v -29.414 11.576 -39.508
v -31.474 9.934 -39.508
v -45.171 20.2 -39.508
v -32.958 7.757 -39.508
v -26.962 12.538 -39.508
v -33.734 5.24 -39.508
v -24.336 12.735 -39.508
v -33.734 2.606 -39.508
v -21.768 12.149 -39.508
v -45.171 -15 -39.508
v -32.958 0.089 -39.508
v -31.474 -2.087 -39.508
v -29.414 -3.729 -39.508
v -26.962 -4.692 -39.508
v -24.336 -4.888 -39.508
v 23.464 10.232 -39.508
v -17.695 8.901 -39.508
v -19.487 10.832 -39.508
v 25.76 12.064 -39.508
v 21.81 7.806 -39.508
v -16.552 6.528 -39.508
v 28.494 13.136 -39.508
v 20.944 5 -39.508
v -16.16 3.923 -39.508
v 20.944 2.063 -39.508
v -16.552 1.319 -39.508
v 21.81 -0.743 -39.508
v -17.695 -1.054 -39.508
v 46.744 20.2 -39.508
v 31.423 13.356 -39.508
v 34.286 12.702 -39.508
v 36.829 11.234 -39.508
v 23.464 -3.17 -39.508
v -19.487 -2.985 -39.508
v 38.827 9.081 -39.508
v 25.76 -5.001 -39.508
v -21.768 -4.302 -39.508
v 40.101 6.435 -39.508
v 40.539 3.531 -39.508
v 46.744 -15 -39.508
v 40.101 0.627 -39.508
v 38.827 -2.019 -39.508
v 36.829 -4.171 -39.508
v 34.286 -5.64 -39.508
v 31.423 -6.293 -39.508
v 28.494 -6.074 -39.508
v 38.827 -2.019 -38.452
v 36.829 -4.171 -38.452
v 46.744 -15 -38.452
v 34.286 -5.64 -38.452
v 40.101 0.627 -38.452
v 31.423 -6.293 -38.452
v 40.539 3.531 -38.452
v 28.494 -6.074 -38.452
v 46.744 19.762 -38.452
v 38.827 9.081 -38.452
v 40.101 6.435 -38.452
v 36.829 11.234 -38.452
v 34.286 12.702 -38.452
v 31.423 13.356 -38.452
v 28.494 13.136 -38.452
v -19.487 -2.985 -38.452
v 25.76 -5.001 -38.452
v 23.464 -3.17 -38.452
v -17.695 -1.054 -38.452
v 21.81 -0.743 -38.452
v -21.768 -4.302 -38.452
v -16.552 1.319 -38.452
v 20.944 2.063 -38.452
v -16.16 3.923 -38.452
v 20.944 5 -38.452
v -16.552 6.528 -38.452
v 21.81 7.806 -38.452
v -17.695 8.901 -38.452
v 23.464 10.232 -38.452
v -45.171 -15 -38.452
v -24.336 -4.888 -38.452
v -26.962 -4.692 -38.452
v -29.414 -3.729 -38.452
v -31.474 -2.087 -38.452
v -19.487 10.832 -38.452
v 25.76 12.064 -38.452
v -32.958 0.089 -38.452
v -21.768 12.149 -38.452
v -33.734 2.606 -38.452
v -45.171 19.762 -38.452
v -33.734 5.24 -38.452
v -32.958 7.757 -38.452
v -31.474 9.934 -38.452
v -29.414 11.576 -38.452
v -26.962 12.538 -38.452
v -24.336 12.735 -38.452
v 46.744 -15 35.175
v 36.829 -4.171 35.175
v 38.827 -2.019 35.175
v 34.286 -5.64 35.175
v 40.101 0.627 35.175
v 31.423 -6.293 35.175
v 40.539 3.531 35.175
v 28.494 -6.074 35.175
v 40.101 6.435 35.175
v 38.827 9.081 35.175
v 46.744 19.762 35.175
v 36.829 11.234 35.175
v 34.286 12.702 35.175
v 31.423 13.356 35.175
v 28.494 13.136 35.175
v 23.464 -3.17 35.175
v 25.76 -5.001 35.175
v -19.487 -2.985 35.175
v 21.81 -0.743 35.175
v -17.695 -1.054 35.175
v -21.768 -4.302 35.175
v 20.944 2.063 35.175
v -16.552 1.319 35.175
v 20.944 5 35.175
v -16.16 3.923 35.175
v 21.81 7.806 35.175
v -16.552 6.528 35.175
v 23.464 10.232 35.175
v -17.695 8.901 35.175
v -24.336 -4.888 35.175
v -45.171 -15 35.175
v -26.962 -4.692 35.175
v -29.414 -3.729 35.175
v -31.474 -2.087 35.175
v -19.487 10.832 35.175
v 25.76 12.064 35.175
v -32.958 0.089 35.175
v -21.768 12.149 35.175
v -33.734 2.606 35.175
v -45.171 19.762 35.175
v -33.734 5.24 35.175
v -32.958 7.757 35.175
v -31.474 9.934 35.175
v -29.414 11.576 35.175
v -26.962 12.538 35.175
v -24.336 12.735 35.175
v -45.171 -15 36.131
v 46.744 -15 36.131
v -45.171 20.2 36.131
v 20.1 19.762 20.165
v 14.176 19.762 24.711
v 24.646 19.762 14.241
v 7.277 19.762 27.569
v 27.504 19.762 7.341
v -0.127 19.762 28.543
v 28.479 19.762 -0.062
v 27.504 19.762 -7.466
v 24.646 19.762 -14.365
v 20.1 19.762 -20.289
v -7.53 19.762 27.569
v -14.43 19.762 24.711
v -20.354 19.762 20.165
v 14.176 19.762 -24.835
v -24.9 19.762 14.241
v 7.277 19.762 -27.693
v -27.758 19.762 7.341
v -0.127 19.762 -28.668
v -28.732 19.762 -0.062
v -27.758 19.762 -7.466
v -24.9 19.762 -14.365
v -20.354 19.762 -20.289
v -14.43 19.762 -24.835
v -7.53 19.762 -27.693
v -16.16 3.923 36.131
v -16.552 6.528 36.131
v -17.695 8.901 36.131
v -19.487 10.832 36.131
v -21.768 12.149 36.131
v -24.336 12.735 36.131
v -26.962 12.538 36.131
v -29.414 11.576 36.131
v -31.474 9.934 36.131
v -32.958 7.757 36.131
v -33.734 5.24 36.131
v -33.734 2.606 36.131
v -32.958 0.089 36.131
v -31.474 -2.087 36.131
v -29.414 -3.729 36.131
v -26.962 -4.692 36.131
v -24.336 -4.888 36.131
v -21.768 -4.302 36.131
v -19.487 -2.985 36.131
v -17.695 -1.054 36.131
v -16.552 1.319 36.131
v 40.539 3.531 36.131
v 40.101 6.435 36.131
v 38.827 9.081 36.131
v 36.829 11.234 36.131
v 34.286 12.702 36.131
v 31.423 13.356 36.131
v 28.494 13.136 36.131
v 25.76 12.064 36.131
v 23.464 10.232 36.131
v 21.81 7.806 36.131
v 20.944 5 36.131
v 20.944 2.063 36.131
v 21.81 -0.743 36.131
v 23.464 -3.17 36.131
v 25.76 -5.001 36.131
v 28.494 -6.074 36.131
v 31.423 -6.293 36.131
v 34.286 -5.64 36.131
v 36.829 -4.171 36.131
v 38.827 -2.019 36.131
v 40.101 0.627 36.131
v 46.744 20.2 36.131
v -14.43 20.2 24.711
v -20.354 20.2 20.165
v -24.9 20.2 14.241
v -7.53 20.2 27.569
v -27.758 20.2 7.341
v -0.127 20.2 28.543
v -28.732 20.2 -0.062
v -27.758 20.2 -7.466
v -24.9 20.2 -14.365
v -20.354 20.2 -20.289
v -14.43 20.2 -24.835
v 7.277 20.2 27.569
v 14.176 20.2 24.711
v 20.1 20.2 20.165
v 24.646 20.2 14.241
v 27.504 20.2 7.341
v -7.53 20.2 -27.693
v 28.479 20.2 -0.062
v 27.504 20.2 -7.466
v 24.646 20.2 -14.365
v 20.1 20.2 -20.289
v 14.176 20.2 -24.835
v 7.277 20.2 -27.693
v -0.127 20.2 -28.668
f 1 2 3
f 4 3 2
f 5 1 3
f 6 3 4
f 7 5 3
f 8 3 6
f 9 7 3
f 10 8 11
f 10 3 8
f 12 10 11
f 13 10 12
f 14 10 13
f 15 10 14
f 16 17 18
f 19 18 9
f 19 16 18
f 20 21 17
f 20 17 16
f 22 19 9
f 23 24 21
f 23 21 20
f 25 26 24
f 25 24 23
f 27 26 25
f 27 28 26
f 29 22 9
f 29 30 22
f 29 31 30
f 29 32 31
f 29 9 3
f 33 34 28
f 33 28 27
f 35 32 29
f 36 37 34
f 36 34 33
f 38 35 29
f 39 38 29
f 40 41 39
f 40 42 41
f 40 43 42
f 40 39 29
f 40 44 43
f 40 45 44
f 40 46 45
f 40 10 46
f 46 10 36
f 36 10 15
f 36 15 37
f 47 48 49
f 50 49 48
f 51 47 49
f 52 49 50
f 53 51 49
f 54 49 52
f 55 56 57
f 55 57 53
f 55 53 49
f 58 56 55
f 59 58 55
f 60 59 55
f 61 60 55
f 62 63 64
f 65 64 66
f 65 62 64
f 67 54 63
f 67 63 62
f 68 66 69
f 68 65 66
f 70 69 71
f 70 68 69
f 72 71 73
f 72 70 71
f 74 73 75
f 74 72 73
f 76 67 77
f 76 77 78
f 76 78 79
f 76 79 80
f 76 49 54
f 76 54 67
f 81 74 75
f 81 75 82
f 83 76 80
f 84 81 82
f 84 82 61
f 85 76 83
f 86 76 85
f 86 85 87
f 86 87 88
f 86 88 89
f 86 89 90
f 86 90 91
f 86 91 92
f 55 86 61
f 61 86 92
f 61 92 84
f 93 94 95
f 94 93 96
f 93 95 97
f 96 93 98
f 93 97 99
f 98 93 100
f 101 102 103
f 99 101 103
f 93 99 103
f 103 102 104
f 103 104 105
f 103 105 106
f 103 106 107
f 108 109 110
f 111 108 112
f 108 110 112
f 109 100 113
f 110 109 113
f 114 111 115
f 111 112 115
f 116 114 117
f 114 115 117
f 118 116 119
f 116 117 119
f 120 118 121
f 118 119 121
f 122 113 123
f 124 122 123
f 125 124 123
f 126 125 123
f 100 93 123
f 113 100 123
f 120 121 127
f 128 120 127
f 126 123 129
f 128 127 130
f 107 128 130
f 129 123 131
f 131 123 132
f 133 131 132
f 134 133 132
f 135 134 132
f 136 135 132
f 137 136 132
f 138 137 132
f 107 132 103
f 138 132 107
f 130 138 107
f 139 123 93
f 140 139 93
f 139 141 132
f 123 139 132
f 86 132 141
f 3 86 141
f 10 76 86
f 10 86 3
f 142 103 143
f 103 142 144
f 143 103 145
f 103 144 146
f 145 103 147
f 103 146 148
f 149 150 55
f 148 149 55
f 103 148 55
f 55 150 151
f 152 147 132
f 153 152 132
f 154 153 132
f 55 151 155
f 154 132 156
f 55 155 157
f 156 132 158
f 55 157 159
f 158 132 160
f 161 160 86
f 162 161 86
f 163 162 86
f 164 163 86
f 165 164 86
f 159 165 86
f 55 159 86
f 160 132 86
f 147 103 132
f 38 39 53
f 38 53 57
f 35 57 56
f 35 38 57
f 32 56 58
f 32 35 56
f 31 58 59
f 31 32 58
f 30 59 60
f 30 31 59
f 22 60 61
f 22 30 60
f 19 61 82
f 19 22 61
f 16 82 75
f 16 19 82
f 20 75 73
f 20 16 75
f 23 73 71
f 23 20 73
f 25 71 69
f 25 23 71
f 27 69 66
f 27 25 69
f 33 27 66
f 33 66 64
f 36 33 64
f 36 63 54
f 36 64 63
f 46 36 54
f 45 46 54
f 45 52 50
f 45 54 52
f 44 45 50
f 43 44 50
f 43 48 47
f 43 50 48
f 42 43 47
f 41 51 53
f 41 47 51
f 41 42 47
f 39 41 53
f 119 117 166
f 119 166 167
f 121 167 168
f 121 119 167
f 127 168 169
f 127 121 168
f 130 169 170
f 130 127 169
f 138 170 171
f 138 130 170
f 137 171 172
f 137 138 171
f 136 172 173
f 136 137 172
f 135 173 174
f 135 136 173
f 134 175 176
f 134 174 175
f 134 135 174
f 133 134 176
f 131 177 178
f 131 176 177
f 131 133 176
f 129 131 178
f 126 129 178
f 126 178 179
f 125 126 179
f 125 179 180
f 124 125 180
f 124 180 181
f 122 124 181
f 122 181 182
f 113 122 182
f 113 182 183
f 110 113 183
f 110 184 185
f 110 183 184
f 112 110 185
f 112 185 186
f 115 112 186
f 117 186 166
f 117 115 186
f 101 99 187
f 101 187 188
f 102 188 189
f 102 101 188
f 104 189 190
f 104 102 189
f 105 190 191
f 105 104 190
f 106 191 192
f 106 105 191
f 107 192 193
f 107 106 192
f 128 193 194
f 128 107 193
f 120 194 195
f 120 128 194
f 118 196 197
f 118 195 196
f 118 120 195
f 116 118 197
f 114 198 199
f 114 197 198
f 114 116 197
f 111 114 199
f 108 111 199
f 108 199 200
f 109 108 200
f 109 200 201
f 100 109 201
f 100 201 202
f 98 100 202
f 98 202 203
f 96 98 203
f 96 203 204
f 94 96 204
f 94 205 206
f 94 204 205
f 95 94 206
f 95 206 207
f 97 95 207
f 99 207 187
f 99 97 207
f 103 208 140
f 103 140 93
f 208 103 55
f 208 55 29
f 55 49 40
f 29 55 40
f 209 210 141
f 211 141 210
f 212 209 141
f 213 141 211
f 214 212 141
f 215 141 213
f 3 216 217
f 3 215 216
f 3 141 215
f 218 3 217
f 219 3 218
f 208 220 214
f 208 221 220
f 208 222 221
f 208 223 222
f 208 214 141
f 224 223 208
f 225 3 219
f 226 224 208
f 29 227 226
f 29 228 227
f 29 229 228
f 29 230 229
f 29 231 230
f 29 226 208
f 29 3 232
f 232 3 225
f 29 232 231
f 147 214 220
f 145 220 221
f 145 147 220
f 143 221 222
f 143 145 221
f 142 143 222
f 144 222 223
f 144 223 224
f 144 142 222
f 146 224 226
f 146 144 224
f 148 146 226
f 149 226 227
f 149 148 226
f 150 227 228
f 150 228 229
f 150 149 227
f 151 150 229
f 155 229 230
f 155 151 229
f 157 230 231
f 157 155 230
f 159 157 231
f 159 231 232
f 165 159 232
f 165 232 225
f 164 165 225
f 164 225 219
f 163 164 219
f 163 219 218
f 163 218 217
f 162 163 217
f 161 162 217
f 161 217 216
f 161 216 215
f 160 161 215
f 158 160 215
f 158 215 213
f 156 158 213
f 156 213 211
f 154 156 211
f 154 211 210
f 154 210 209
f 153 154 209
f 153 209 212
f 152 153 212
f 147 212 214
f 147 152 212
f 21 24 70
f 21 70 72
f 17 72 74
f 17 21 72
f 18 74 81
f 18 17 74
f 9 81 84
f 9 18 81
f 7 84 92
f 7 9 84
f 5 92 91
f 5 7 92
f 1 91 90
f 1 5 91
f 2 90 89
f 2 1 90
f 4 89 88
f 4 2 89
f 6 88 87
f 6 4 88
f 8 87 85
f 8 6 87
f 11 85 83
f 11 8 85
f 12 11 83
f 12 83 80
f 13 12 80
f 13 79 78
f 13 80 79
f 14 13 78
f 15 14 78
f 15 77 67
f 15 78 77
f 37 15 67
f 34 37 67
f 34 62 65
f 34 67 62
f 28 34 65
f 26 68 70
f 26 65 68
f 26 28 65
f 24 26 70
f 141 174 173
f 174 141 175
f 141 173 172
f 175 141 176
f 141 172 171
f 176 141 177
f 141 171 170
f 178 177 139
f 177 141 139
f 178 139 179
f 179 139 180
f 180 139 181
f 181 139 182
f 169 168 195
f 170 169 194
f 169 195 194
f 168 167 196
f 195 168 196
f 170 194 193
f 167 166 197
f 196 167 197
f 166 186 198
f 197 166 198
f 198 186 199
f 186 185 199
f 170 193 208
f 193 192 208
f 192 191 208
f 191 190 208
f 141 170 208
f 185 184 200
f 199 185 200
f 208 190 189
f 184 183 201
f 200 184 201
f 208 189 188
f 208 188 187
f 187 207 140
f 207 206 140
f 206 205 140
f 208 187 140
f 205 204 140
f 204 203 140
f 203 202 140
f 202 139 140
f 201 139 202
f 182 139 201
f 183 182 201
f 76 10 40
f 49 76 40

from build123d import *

# Parameters (mm, degrees)
BOSS_EXTRUDE1_DEPTH      = 20.2
BOSS_EXTRUDE1_DEPTH_BACK = 15
SKETCH1_W                = 93.989323661
SKETCH1_H                = 75.639027137
SKETCH1_R                = 28.60558576
CUT_EXTRUDE1_DEPTH       = 65.815428125
CUT_EXTRUDE1_DEPTH_BACK  = 65.815428125
SKETCH7_W                = 73.626868744
SKETCH7_H                = 46
CUT_EXTRUDE2_DEPTH       = 71.936871393
CUT_EXTRUDE2_DEPTH_BACK  = 71.936871393
SKETCH8_W                = 2.074297069
SKETCH8_H                = 75.639027137
CUT_EXTRUDE3_DEPTH       = 92.182778922
CUT_EXTRUDE3_DEPTH_BACK  = 92.182778922
SKETCH9_R                = 9.85217033
SKETCH9_R_2              = 8.836553466


with BuildPart() as part:
    # Sketch1 → Boss-Extrude1 (new, two sides: drawn at the far end of the back side and taken through both)
    # profile 1 of 2: a face of its own
    with BuildSketch(Plane(origin=(0, 0, 0), x_dir=(1, 0, 0), z_dir=(0, 1, 0)).offset(-BOSS_EXTRUDE1_DEPTH_BACK)):
        with Locations((-0.250713069, 1.688387839)):
            Rectangle(SKETCH1_W, SKETCH1_H)
        Polygon((-15.47568065, 38.452030524), (-15.44512512, 38.452030524), (17.164906021, 38.452030524), (43.185007565, 38.452030524), (45.754987202, 38.452030524), (45.754987202, 32.455155104), (45.754987202, 32.45391936), (45.754987202, -35.17483185), (17.616871532, -35.17483185), (-15.375759604, -35.17483185), (-46.245033324, -35.17483185), (-46.245033324, 38.452030524), (-43.675074212, 38.452030524), align=None, mode=Mode.SUBTRACT)
    # profile 2 of 2: a face of its own
    with BuildSketch(Plane(origin=(0, 0, 0), x_dir=(1, 0, 0), z_dir=(0, 1, 0)).offset(-BOSS_EXTRUDE1_DEPTH_BACK)):
        Polygon((17.164906021, 38.452030524), (-15.44512512, 38.452030524), (-15.47568065, 38.452030524), (-43.675074212, 38.452030524), (-46.245033324, 38.452030524), (-46.245033324, -35.17483185), (-15.375759604, -35.17483185), (17.616871532, -35.17483185), (45.754987202, -35.17483185), (45.754987202, 32.45391936), (45.754987202, 32.455155104), (45.754987202, 38.452030524), (43.185007565, 38.452030524), align=None)
        with Locations(Location((-0.126795962, 0.062260433, 0), (0, 0, 270))):
            Circle(SKETCH1_R, mode=Mode.SUBTRACT)
    extrude(amount=BOSS_EXTRUDE1_DEPTH + BOSS_EXTRUDE1_DEPTH_BACK)

    # Sketch7 → Cut-Extrude1 (cut, two sides: drawn at the far end of the back side and taken through both)
    with BuildSketch(Plane(origin=(0, 0, 0), x_dir=(0, 0, -1), z_dir=(1, 0, 0)).offset(-CUT_EXTRUDE1_DEPTH_BACK)):
        with Locations((1.63860241, -3.238314763)):
            Rectangle(SKETCH7_W, SKETCH7_H)
    extrude(amount=CUT_EXTRUDE1_DEPTH + CUT_EXTRUDE1_DEPTH_BACK, mode=Mode.SUBTRACT)

    # Sketch8 → Cut-Extrude2 (cut, two sides: drawn at the far end of the back side and taken through both)
    with BuildSketch(Plane(origin=(0, 20.2, 0), x_dir=(1, 0, 0), z_dir=(0, 1, 0)).offset(-CUT_EXTRUDE2_DEPTH_BACK)):
        with Locations((-46.208226366, 1.688387839)):
            Rectangle(SKETCH8_W, SKETCH8_H)
    extrude(amount=CUT_EXTRUDE2_DEPTH + CUT_EXTRUDE2_DEPTH_BACK, mode=Mode.SUBTRACT)

    # Sketch9 → Cut-Extrude3 (cut, two sides: drawn at the far end of the back side and taken through both)
    with BuildSketch(Plane.XY.offset(36.131125729).offset(-CUT_EXTRUDE3_DEPTH_BACK)):
        with Locations((30.686426908, 3.531311209)):
            Circle(SKETCH9_R)
        with Locations((-24.996180107, 3.923442244)):
            Circle(SKETCH9_R_2)
    extrude(amount=CUT_EXTRUDE3_DEPTH + CUT_EXTRUDE3_DEPTH_BACK, mode=Mode.SUBTRACT)


solid = part.part
